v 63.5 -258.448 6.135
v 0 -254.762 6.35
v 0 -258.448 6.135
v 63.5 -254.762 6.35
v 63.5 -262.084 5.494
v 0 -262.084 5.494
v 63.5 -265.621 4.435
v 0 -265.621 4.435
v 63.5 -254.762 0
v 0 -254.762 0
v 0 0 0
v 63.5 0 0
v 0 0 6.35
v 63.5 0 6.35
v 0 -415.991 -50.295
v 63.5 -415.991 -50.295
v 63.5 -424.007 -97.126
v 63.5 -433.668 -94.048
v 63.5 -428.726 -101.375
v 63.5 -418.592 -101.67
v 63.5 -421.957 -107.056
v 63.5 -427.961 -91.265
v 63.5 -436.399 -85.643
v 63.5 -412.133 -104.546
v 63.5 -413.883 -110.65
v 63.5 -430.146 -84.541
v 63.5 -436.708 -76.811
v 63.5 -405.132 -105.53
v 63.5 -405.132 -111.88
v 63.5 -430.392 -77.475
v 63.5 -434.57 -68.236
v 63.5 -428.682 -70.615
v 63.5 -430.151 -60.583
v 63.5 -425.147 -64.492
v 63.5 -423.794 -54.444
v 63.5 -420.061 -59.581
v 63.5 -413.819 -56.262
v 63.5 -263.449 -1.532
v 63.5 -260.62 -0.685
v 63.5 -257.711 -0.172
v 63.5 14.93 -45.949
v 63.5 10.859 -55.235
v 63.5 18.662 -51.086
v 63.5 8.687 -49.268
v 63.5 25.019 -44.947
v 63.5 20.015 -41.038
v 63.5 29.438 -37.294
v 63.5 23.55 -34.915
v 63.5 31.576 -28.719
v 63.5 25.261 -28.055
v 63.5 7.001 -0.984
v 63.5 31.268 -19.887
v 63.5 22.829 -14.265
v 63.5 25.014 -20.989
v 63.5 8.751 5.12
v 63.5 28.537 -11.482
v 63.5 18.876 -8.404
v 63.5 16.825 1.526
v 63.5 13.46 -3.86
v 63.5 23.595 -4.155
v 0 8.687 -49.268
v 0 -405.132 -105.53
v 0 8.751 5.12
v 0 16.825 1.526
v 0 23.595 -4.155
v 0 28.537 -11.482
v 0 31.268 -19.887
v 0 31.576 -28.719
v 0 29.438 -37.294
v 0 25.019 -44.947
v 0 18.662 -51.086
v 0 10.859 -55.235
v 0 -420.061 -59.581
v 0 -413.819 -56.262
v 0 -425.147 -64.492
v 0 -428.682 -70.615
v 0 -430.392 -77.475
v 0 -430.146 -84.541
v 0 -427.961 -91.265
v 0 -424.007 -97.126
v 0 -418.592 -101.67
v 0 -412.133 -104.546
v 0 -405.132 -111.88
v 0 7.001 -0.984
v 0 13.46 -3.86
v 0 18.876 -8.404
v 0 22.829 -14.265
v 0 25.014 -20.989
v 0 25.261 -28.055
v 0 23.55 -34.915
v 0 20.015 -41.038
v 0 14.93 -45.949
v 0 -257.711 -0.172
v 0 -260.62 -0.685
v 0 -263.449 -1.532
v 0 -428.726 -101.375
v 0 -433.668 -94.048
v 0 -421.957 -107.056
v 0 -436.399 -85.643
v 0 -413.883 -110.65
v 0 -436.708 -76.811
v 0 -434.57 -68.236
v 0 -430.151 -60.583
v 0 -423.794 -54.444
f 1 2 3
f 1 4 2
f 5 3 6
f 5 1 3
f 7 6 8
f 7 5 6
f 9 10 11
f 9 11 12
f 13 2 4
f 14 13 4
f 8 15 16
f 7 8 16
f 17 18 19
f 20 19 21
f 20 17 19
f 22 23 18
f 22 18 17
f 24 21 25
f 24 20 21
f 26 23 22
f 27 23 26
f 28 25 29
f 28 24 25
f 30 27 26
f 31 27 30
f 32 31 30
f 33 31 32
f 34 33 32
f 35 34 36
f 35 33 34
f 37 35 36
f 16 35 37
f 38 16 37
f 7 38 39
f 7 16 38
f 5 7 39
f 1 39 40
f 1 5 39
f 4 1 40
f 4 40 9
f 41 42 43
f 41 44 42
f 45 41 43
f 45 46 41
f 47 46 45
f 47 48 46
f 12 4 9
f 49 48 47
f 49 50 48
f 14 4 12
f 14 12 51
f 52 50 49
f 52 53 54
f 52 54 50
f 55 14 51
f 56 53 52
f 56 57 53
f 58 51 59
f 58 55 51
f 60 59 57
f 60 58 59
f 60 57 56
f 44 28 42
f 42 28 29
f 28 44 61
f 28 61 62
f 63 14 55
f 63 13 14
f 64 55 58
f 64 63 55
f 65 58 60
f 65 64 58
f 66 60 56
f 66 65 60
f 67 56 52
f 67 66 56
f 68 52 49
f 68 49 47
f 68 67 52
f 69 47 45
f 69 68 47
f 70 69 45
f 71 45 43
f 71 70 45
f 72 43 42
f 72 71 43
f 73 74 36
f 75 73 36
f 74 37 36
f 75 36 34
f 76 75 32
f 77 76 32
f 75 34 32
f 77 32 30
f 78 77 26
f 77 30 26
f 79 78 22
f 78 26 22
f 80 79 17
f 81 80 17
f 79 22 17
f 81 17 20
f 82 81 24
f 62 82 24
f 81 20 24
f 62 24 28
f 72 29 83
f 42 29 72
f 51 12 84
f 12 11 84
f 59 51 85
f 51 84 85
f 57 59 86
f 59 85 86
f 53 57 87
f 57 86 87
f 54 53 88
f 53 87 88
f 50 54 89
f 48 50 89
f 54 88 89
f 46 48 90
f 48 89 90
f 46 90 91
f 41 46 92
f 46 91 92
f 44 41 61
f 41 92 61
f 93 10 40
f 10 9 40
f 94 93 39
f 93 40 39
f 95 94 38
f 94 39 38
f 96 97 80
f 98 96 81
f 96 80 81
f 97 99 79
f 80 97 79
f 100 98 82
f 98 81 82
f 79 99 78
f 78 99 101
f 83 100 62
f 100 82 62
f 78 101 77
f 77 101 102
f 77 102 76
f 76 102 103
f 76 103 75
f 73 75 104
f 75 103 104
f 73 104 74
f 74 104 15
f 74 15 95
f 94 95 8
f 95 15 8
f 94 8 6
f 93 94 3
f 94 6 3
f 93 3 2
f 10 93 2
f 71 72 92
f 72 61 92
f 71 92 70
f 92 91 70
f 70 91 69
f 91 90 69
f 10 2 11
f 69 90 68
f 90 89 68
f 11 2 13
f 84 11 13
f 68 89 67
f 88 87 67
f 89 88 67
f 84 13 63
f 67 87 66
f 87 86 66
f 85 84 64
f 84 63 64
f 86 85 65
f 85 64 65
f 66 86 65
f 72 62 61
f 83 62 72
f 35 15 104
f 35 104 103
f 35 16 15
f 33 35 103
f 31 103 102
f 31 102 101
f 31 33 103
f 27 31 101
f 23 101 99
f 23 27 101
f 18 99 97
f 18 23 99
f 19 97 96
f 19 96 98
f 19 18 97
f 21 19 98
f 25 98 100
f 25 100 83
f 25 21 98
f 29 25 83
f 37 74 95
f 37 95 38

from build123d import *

# Parameters (mm, degrees)
F0_W      = 63.5
F0_H      = 6.35
F1_DEPTH  = 254.762
F2_W      = 63.5
F2_H      = 6.35
F3_ANGLE  = 20
F4_W      = 63.5
F4_H      = 6.35
F5_DEPTH  = 160.02
F6_W      = 63.5
F6_H      = 6.35
F7_ANGLE  = 160
F8_W      = 63.5
F8_H      = 6.35
F9_ANGLE  = 160
F11_DEPTH = 63.5


with BuildPart() as f1:
    # F0 (on Front) → F1 (new body)
    with BuildSketch(Plane.XZ):
        with Locations((31.75, 3.175)):
            Rectangle(F0_W, F0_H)
    extrude(amount=F1_DEPTH)

    # F2 (on face) → F3 (revolve)
    with BuildSketch(Plane.XZ.offset(254.762)):
        with Locations((31.75, 3.175)):
            Rectangle(F2_W, F2_H)
    revolve(axis=Axis((31.75, -254.762, -25.4), (1, 0, 0)), revolution_arc=F3_ANGLE)

    # F4 (on face) → F5 (join)
    with BuildSketch(Plane(origin=(0, -233.123909852, -84.8501640819), x_dir=(1, 0, 0), z_dir=(0, -0.9396926208, -0.3420201433))):
        with Locations((31.75, 91.840543186)):
            Rectangle(F4_W, F4_H)
    extrude(amount=F5_DEPTH)

    # F6 (on face) → F7 (revolve)
    with BuildSketch(Plane(origin=(0, -383.4935230301, -139.5802274168), x_dir=(1, 0, 0), z_dir=(0, -0.9396926208, -0.3420201433))):
        with Locations((31.75, 91.840543186)):
            Rectangle(F6_W, F6_H)
    revolve(axis=Axis((31.75, -405.1316131782, -80.130063335), (1, 0, 0)), revolution_arc=F7_ANGLE)

    # F8 (on face) → F9 (revolve)
    with BuildSketch(Plane(origin=(0, 0, 0), x_dir=(-1, 0, 0), z_dir=(0, 1, 0))):
        with Locations((-31.75, 3.175)):
            Rectangle(F8_W, F8_H)
    revolve(axis=Axis((31.75, 0, -25.4), (-1, 0, 0)), revolution_arc=F9_ANGLE)

    # F10 (on face) → F11 (join)
    with BuildSketch(Plane.YZ.offset(63.5)):
        Polygon((-405.1316131782, -105.530063335), (-405.1316131782, -111.880063335), (10.8591395506, -55.23524071), (8.6873116405, -49.268192568), align=None)
    extrude(amount=-F11_DEPTH)


solid = f1.part
